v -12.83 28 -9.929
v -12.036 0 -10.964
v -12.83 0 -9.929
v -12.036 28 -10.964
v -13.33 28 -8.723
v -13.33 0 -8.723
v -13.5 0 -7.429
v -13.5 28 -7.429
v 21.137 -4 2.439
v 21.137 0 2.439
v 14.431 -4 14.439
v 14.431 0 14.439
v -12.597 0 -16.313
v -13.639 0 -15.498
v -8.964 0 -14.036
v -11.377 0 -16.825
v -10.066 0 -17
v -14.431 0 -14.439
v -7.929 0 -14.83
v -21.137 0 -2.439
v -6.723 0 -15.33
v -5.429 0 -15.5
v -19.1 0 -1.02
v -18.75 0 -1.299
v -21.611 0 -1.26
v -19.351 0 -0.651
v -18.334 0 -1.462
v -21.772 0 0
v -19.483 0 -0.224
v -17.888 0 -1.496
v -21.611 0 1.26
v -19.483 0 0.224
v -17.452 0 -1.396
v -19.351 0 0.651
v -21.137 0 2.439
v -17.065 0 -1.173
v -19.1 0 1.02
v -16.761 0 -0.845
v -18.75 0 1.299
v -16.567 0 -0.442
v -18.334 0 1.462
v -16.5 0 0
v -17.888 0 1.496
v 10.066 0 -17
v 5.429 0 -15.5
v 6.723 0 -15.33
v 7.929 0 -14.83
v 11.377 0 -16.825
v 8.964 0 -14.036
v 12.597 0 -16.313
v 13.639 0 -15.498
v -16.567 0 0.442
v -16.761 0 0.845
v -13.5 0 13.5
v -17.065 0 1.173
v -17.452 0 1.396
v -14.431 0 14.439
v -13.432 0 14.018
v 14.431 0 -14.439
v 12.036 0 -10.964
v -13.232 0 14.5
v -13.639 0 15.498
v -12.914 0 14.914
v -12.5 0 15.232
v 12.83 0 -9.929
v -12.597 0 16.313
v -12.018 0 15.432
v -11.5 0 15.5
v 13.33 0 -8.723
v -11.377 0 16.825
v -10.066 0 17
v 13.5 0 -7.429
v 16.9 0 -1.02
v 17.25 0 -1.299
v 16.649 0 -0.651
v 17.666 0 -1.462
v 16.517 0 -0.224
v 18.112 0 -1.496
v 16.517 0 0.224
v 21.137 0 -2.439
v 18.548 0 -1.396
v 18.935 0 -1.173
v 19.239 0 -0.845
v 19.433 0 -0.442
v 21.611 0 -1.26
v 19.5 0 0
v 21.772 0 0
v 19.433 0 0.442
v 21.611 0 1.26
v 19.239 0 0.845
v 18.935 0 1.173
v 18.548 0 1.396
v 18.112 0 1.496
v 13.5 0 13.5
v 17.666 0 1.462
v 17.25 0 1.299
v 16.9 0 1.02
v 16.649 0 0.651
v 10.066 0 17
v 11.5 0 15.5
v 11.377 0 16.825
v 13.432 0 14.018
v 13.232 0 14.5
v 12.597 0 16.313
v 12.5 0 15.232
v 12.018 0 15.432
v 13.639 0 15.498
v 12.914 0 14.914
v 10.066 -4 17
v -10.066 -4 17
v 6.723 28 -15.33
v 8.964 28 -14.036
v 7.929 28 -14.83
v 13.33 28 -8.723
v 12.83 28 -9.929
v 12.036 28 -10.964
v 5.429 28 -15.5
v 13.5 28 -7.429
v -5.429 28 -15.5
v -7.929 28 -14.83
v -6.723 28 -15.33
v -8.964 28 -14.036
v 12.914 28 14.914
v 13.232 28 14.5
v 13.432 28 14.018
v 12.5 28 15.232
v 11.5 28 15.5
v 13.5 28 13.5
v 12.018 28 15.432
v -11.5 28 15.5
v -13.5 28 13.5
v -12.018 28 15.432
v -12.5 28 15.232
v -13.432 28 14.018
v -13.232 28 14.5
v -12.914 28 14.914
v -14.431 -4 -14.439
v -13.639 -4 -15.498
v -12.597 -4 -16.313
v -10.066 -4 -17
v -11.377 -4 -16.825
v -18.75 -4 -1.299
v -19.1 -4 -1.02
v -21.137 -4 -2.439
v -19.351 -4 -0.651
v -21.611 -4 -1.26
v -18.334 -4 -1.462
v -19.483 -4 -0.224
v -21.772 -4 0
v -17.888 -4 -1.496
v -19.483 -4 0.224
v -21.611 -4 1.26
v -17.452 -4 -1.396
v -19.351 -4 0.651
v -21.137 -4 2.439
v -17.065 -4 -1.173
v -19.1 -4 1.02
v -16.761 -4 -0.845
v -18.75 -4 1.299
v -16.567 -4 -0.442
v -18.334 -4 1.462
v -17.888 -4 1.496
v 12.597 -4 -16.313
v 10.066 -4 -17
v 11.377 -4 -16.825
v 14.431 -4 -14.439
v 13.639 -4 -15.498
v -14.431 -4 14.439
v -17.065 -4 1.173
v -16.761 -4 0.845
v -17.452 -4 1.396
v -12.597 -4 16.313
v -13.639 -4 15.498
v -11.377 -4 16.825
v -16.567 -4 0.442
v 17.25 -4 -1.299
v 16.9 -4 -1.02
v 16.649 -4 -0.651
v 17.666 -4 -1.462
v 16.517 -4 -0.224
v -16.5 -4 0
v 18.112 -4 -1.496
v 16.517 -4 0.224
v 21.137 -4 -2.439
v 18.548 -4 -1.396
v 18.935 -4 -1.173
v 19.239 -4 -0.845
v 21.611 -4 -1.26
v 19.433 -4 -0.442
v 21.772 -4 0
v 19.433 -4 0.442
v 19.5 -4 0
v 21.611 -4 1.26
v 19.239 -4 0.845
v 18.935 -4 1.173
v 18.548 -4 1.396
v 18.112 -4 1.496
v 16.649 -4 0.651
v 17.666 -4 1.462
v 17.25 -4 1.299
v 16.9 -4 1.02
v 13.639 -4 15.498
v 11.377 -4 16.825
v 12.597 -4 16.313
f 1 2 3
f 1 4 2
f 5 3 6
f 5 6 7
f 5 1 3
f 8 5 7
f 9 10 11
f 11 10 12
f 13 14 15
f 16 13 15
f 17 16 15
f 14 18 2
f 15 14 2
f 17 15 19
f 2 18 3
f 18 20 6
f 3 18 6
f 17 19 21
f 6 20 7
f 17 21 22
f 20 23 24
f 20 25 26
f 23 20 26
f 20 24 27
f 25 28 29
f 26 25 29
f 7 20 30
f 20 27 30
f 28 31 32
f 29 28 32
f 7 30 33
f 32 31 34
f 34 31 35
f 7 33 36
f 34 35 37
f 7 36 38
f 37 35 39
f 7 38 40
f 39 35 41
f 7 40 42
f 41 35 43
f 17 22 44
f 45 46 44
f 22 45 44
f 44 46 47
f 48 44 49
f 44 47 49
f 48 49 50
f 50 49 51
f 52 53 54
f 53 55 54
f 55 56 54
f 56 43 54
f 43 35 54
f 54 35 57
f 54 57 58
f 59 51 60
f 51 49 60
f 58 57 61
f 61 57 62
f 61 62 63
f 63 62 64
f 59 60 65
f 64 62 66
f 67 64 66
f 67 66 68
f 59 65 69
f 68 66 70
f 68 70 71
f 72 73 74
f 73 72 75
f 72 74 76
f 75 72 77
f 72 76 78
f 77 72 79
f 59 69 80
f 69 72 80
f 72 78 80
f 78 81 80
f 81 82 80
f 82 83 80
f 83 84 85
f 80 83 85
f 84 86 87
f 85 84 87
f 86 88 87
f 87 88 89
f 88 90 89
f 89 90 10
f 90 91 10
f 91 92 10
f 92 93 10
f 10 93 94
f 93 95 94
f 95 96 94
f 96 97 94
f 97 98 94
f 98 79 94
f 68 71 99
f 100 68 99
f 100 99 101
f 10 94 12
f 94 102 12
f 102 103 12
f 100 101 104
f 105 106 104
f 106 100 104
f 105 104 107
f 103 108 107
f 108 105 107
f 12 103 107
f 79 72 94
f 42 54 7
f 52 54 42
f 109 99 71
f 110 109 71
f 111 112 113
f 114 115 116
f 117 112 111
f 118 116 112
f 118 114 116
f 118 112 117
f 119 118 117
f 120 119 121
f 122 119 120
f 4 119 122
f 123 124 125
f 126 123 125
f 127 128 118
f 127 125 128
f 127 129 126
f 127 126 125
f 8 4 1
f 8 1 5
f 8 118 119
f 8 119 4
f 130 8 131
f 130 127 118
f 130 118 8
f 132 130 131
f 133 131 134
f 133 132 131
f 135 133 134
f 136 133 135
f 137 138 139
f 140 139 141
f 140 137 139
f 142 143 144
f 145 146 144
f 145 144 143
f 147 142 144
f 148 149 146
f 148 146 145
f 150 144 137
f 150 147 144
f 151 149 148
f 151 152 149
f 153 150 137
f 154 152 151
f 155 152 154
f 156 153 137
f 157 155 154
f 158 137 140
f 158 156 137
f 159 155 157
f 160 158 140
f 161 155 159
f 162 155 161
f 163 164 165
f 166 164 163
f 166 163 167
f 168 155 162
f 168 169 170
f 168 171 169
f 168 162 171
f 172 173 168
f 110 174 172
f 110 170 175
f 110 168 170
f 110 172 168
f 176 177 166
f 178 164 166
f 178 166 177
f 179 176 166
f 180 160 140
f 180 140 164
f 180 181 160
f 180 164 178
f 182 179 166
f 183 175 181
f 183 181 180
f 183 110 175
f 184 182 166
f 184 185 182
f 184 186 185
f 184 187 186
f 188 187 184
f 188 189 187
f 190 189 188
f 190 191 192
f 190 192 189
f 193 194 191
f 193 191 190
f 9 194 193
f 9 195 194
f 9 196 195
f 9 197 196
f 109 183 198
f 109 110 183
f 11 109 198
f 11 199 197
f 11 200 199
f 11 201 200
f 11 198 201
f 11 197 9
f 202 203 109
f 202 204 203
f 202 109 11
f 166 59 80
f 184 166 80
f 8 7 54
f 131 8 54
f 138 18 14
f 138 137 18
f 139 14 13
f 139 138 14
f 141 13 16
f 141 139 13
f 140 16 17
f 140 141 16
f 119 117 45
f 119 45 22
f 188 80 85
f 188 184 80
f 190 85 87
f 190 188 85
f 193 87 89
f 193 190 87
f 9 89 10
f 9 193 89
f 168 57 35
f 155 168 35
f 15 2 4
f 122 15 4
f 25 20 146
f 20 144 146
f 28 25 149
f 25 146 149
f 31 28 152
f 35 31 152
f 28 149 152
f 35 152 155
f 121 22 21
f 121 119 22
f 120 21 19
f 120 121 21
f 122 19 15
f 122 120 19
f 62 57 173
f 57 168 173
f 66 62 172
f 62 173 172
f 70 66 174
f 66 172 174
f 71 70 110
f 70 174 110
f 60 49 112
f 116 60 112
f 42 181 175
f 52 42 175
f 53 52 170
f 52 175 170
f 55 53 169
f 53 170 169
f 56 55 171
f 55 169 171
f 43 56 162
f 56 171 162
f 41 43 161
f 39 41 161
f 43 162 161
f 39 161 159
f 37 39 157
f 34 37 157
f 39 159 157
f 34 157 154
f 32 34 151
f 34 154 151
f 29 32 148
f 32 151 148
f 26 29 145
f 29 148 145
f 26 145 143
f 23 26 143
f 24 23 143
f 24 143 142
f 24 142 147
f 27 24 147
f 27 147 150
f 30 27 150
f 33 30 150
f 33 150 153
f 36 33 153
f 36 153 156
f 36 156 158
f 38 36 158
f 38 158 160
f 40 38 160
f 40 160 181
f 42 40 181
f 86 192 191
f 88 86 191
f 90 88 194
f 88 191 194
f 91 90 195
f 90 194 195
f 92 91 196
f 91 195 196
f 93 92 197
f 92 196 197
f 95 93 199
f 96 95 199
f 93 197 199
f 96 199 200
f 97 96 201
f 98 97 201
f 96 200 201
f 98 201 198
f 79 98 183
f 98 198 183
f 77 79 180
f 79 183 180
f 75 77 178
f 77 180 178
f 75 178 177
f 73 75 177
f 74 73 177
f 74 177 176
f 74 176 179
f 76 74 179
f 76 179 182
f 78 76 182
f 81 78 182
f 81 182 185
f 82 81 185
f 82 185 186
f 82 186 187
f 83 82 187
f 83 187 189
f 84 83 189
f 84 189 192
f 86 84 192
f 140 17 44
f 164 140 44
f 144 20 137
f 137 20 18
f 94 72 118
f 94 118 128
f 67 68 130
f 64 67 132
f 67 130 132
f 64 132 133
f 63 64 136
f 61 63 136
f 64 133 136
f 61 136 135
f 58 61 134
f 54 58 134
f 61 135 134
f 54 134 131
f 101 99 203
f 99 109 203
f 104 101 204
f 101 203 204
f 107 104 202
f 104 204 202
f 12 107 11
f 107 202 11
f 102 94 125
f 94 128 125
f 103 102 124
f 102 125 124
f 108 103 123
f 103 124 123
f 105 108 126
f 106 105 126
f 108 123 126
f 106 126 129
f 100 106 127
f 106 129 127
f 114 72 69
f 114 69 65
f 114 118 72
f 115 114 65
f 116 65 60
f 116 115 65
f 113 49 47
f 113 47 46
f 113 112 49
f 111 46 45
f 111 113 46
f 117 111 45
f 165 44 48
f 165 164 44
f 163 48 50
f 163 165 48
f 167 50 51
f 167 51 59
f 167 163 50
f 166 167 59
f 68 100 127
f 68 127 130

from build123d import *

# Parameters (mm, degrees)
F1_DEPTH = 4
F2_W     = 27
F2_H     = 31
F3_DEPTH = 28
F4_R     = 2
F5_R     = 5
F6_R     = 1.5
F7_DEPTH = 25
F8_SIZE  = 6
F9_R     = 5
F10_R    = 5


with BuildPart() as f1:
    # F0 (on Front) → F1 (new body)
    with BuildSketch(Plane.XZ):
        Polygon((-13, -17), (13, -17), (22.5, 0), (13, 17), (-13, 17), (-22.5, 0), align=None)
    extrude(amount=F1_DEPTH)

    # F2 (on face) → F3 (join)
    with BuildSketch(Plane(origin=(0, 0, 0), x_dir=(-1, 0, 0), z_dir=(0, 1, 0))):
        Rectangle(F2_W, F2_H)
    extrude(amount=F3_DEPTH)

    # F4
    f4_edges = [f1.edges().sort_by_distance(p)[0] for p in [
        (-13.5, 14, 15.5),
        (13.5, 14, 15.5),
    ]]
    fillet(f4_edges, radius=F4_R)

    # F5
    f5_edges = [f1.edges().sort_by_distance(p)[0] for p in [
        (-22.5, -2, 0),
        (22.5, -2, 0),
    ]]
    fillet(f5_edges, radius=F5_R)

    # F6 (on face) → F7 (cut)
    with BuildSketch(Plane.XZ.offset(4)):
        with Locations((-18, 0)):
            Circle(F6_R)
        with Locations((18, 0)):
            Circle(F6_R)
    extrude(amount=-F7_DEPTH, mode=Mode.SUBTRACT)

    # F8
    f8_edges = [f1.edges().sort_by_distance(p)[0] for p in [
        (13.5, 14, -15.5),
        (-13.5, 14, -15.5),
    ]]
    chamfer(f8_edges, length=F8_SIZE)

    # F9
    f9_edges = [f1.edges().sort_by_distance(p)[0] for p in [
        (13, -2, 17),
        (-13, -2, 17),
        (13, -2, -17),
        (-13, -2, -17),
    ]]
    fillet(f9_edges, radius=F9_R)

    # F10
    f10_edges = [f1.edges().sort_by_distance(p)[0] for p in [
        (-13.5, 14, -9.5),
        (-7.5, 14, -15.5),
        (7.5, 14, -15.5),
        (13.5, 14, -9.5),
    ]]
    fillet(f10_edges, radius=F10_R)


solid = f1.part
